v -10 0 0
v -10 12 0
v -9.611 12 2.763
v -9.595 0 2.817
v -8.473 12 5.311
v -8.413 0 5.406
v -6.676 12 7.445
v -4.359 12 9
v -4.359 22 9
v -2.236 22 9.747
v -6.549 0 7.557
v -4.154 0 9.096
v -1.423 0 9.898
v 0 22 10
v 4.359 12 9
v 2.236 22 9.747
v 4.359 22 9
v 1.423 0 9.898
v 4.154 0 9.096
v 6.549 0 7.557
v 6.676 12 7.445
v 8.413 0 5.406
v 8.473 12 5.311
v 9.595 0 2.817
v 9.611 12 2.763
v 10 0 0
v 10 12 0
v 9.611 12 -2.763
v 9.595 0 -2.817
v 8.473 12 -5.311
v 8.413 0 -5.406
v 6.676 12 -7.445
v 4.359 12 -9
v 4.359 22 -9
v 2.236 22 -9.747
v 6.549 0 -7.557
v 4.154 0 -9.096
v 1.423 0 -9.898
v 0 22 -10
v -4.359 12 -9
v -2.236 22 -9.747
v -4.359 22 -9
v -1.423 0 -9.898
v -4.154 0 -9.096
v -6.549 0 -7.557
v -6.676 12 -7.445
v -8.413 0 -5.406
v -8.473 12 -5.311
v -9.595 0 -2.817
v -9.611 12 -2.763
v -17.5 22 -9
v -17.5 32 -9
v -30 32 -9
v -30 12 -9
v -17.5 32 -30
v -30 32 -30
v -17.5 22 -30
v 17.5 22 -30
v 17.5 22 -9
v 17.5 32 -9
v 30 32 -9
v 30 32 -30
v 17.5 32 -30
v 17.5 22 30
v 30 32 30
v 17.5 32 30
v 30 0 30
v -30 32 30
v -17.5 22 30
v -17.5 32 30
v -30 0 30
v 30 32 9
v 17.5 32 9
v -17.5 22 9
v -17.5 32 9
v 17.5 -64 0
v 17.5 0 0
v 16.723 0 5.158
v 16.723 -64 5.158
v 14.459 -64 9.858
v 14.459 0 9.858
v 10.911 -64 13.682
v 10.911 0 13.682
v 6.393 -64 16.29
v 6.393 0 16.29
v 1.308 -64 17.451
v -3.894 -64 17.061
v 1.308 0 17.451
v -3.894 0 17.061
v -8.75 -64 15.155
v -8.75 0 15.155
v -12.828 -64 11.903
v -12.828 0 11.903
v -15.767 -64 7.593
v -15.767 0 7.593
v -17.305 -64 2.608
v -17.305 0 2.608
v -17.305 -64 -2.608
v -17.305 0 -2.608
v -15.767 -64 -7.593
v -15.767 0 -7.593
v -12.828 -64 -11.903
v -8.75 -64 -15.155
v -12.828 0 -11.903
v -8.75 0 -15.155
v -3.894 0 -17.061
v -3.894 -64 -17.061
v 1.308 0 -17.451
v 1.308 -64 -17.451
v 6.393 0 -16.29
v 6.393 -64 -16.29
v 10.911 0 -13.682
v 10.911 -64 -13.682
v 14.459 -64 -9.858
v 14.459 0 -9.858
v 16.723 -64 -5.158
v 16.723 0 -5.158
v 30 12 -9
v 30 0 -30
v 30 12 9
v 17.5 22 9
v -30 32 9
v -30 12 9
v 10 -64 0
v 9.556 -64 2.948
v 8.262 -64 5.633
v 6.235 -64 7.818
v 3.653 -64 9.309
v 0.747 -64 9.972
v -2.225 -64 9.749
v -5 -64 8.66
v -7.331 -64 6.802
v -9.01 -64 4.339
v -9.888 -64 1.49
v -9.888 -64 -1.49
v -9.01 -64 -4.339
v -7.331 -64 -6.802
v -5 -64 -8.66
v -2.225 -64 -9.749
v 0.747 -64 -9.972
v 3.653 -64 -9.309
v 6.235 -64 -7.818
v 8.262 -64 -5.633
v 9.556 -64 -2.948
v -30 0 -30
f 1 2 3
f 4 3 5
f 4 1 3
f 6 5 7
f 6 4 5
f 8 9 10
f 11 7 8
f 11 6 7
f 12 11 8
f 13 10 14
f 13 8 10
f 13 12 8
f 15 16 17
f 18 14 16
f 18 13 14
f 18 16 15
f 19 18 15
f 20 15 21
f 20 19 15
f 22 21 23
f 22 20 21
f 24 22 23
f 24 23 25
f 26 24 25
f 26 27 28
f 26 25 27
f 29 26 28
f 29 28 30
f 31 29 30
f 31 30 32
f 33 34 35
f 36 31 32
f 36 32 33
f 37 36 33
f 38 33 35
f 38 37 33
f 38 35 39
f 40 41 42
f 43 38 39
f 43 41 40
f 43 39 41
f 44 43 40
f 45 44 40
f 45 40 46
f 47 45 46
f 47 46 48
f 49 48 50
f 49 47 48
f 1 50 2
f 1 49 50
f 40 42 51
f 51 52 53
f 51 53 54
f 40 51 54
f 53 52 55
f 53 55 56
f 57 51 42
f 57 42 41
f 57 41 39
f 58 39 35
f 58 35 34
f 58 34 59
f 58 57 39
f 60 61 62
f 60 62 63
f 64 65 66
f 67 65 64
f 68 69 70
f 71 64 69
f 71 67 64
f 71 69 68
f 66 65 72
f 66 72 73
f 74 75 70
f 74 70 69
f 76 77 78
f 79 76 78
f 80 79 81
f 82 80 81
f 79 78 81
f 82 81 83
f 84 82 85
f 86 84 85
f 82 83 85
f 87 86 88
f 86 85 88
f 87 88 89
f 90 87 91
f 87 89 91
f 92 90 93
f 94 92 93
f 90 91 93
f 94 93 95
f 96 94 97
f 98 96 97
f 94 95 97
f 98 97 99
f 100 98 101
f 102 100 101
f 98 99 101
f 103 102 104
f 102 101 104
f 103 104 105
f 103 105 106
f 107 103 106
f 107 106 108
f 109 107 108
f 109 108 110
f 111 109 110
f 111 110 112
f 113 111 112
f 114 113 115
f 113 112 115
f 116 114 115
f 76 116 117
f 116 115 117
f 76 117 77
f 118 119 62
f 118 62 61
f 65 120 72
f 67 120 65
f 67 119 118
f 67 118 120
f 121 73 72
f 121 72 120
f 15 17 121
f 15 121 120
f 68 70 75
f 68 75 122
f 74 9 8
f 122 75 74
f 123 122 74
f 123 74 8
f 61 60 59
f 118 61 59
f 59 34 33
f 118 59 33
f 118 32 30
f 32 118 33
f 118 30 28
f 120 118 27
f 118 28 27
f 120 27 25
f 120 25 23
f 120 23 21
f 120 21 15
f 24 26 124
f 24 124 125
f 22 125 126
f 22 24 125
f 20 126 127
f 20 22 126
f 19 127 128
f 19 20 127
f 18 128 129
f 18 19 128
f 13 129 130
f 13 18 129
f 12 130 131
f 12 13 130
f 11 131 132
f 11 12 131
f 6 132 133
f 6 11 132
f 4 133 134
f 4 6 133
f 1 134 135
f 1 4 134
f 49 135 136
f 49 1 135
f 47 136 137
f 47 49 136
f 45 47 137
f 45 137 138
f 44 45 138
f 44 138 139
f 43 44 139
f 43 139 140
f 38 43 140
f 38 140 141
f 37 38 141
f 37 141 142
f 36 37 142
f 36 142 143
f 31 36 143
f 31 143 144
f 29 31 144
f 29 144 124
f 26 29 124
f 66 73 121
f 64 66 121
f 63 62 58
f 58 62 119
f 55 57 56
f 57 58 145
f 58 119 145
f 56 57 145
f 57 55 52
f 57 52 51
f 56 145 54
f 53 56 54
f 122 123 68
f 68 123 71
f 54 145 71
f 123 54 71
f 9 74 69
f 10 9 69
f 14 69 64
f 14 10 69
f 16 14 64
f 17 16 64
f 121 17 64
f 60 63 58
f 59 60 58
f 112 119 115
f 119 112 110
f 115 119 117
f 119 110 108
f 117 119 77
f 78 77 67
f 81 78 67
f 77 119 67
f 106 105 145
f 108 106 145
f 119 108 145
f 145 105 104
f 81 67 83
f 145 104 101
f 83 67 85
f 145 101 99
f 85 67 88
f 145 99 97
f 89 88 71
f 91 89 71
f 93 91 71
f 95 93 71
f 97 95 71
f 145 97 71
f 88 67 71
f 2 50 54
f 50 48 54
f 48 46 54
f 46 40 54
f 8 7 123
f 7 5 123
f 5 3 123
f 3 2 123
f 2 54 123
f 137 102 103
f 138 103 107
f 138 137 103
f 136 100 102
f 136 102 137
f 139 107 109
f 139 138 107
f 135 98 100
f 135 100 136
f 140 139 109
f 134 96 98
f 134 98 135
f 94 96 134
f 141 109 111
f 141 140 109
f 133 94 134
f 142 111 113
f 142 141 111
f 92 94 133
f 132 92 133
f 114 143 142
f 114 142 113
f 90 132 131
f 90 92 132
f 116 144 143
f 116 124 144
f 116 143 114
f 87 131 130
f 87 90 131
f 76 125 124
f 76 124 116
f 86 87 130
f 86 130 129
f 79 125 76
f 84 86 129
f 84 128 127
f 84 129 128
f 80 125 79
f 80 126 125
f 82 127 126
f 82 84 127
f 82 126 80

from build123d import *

# Parameters (mm, degrees)
F0_R     = 17.5
F0_R_2   = 10
F1_DEPTH = 64
F2_W     = 60
F2_H     = 60
F2_R     = 17.5
F2_R_2   = 10
F3_DEPTH = 32
F4_W     = 35
F4_H     = 10
F5_DEPTH = 60.001
F6_W     = 20
F6_H     = 18
F7_DEPTH = 60.001


with BuildPart() as f1:
    # F0 (on Front) → F1 (new body)
    with BuildSketch(Plane.XZ):
        Circle(F0_R)
        Circle(F0_R_2, mode=Mode.SUBTRACT)
    extrude(amount=F1_DEPTH)

    # F2 (on face) → F3 (join)
    with BuildSketch(Plane(origin=(0, 0, 0), x_dir=(-1, 0, 0), z_dir=(0, 1, 0))):
        Rectangle(F2_W, F2_H)
        Circle(F2_R, mode=Mode.SUBTRACT)
        Circle(F2_R)
        Circle(F2_R_2, mode=Mode.SUBTRACT)
    extrude(amount=F3_DEPTH)

    # F4 (on face) → F5 (cut, through all)
    with BuildSketch(Plane(origin=(0, 0, -30), x_dir=(1, 0, 0), z_dir=(0, 0, -1))):
        with Locations((0, -27)):
            Rectangle(F4_W, F4_H)
    extrude(amount=-F5_DEPTH, mode=Mode.SUBTRACT)

    # F6 (on face) → F7 (cut, through all)
    with BuildSketch(Plane(origin=(-30, 0, 0), x_dir=(0, -1, 0), z_dir=(-1, 0, 0))):
        with Locations((-22, 0)):
            Rectangle(F6_W, F6_H)
    extrude(amount=-F7_DEPTH, mode=Mode.SUBTRACT)


solid = f1.part
